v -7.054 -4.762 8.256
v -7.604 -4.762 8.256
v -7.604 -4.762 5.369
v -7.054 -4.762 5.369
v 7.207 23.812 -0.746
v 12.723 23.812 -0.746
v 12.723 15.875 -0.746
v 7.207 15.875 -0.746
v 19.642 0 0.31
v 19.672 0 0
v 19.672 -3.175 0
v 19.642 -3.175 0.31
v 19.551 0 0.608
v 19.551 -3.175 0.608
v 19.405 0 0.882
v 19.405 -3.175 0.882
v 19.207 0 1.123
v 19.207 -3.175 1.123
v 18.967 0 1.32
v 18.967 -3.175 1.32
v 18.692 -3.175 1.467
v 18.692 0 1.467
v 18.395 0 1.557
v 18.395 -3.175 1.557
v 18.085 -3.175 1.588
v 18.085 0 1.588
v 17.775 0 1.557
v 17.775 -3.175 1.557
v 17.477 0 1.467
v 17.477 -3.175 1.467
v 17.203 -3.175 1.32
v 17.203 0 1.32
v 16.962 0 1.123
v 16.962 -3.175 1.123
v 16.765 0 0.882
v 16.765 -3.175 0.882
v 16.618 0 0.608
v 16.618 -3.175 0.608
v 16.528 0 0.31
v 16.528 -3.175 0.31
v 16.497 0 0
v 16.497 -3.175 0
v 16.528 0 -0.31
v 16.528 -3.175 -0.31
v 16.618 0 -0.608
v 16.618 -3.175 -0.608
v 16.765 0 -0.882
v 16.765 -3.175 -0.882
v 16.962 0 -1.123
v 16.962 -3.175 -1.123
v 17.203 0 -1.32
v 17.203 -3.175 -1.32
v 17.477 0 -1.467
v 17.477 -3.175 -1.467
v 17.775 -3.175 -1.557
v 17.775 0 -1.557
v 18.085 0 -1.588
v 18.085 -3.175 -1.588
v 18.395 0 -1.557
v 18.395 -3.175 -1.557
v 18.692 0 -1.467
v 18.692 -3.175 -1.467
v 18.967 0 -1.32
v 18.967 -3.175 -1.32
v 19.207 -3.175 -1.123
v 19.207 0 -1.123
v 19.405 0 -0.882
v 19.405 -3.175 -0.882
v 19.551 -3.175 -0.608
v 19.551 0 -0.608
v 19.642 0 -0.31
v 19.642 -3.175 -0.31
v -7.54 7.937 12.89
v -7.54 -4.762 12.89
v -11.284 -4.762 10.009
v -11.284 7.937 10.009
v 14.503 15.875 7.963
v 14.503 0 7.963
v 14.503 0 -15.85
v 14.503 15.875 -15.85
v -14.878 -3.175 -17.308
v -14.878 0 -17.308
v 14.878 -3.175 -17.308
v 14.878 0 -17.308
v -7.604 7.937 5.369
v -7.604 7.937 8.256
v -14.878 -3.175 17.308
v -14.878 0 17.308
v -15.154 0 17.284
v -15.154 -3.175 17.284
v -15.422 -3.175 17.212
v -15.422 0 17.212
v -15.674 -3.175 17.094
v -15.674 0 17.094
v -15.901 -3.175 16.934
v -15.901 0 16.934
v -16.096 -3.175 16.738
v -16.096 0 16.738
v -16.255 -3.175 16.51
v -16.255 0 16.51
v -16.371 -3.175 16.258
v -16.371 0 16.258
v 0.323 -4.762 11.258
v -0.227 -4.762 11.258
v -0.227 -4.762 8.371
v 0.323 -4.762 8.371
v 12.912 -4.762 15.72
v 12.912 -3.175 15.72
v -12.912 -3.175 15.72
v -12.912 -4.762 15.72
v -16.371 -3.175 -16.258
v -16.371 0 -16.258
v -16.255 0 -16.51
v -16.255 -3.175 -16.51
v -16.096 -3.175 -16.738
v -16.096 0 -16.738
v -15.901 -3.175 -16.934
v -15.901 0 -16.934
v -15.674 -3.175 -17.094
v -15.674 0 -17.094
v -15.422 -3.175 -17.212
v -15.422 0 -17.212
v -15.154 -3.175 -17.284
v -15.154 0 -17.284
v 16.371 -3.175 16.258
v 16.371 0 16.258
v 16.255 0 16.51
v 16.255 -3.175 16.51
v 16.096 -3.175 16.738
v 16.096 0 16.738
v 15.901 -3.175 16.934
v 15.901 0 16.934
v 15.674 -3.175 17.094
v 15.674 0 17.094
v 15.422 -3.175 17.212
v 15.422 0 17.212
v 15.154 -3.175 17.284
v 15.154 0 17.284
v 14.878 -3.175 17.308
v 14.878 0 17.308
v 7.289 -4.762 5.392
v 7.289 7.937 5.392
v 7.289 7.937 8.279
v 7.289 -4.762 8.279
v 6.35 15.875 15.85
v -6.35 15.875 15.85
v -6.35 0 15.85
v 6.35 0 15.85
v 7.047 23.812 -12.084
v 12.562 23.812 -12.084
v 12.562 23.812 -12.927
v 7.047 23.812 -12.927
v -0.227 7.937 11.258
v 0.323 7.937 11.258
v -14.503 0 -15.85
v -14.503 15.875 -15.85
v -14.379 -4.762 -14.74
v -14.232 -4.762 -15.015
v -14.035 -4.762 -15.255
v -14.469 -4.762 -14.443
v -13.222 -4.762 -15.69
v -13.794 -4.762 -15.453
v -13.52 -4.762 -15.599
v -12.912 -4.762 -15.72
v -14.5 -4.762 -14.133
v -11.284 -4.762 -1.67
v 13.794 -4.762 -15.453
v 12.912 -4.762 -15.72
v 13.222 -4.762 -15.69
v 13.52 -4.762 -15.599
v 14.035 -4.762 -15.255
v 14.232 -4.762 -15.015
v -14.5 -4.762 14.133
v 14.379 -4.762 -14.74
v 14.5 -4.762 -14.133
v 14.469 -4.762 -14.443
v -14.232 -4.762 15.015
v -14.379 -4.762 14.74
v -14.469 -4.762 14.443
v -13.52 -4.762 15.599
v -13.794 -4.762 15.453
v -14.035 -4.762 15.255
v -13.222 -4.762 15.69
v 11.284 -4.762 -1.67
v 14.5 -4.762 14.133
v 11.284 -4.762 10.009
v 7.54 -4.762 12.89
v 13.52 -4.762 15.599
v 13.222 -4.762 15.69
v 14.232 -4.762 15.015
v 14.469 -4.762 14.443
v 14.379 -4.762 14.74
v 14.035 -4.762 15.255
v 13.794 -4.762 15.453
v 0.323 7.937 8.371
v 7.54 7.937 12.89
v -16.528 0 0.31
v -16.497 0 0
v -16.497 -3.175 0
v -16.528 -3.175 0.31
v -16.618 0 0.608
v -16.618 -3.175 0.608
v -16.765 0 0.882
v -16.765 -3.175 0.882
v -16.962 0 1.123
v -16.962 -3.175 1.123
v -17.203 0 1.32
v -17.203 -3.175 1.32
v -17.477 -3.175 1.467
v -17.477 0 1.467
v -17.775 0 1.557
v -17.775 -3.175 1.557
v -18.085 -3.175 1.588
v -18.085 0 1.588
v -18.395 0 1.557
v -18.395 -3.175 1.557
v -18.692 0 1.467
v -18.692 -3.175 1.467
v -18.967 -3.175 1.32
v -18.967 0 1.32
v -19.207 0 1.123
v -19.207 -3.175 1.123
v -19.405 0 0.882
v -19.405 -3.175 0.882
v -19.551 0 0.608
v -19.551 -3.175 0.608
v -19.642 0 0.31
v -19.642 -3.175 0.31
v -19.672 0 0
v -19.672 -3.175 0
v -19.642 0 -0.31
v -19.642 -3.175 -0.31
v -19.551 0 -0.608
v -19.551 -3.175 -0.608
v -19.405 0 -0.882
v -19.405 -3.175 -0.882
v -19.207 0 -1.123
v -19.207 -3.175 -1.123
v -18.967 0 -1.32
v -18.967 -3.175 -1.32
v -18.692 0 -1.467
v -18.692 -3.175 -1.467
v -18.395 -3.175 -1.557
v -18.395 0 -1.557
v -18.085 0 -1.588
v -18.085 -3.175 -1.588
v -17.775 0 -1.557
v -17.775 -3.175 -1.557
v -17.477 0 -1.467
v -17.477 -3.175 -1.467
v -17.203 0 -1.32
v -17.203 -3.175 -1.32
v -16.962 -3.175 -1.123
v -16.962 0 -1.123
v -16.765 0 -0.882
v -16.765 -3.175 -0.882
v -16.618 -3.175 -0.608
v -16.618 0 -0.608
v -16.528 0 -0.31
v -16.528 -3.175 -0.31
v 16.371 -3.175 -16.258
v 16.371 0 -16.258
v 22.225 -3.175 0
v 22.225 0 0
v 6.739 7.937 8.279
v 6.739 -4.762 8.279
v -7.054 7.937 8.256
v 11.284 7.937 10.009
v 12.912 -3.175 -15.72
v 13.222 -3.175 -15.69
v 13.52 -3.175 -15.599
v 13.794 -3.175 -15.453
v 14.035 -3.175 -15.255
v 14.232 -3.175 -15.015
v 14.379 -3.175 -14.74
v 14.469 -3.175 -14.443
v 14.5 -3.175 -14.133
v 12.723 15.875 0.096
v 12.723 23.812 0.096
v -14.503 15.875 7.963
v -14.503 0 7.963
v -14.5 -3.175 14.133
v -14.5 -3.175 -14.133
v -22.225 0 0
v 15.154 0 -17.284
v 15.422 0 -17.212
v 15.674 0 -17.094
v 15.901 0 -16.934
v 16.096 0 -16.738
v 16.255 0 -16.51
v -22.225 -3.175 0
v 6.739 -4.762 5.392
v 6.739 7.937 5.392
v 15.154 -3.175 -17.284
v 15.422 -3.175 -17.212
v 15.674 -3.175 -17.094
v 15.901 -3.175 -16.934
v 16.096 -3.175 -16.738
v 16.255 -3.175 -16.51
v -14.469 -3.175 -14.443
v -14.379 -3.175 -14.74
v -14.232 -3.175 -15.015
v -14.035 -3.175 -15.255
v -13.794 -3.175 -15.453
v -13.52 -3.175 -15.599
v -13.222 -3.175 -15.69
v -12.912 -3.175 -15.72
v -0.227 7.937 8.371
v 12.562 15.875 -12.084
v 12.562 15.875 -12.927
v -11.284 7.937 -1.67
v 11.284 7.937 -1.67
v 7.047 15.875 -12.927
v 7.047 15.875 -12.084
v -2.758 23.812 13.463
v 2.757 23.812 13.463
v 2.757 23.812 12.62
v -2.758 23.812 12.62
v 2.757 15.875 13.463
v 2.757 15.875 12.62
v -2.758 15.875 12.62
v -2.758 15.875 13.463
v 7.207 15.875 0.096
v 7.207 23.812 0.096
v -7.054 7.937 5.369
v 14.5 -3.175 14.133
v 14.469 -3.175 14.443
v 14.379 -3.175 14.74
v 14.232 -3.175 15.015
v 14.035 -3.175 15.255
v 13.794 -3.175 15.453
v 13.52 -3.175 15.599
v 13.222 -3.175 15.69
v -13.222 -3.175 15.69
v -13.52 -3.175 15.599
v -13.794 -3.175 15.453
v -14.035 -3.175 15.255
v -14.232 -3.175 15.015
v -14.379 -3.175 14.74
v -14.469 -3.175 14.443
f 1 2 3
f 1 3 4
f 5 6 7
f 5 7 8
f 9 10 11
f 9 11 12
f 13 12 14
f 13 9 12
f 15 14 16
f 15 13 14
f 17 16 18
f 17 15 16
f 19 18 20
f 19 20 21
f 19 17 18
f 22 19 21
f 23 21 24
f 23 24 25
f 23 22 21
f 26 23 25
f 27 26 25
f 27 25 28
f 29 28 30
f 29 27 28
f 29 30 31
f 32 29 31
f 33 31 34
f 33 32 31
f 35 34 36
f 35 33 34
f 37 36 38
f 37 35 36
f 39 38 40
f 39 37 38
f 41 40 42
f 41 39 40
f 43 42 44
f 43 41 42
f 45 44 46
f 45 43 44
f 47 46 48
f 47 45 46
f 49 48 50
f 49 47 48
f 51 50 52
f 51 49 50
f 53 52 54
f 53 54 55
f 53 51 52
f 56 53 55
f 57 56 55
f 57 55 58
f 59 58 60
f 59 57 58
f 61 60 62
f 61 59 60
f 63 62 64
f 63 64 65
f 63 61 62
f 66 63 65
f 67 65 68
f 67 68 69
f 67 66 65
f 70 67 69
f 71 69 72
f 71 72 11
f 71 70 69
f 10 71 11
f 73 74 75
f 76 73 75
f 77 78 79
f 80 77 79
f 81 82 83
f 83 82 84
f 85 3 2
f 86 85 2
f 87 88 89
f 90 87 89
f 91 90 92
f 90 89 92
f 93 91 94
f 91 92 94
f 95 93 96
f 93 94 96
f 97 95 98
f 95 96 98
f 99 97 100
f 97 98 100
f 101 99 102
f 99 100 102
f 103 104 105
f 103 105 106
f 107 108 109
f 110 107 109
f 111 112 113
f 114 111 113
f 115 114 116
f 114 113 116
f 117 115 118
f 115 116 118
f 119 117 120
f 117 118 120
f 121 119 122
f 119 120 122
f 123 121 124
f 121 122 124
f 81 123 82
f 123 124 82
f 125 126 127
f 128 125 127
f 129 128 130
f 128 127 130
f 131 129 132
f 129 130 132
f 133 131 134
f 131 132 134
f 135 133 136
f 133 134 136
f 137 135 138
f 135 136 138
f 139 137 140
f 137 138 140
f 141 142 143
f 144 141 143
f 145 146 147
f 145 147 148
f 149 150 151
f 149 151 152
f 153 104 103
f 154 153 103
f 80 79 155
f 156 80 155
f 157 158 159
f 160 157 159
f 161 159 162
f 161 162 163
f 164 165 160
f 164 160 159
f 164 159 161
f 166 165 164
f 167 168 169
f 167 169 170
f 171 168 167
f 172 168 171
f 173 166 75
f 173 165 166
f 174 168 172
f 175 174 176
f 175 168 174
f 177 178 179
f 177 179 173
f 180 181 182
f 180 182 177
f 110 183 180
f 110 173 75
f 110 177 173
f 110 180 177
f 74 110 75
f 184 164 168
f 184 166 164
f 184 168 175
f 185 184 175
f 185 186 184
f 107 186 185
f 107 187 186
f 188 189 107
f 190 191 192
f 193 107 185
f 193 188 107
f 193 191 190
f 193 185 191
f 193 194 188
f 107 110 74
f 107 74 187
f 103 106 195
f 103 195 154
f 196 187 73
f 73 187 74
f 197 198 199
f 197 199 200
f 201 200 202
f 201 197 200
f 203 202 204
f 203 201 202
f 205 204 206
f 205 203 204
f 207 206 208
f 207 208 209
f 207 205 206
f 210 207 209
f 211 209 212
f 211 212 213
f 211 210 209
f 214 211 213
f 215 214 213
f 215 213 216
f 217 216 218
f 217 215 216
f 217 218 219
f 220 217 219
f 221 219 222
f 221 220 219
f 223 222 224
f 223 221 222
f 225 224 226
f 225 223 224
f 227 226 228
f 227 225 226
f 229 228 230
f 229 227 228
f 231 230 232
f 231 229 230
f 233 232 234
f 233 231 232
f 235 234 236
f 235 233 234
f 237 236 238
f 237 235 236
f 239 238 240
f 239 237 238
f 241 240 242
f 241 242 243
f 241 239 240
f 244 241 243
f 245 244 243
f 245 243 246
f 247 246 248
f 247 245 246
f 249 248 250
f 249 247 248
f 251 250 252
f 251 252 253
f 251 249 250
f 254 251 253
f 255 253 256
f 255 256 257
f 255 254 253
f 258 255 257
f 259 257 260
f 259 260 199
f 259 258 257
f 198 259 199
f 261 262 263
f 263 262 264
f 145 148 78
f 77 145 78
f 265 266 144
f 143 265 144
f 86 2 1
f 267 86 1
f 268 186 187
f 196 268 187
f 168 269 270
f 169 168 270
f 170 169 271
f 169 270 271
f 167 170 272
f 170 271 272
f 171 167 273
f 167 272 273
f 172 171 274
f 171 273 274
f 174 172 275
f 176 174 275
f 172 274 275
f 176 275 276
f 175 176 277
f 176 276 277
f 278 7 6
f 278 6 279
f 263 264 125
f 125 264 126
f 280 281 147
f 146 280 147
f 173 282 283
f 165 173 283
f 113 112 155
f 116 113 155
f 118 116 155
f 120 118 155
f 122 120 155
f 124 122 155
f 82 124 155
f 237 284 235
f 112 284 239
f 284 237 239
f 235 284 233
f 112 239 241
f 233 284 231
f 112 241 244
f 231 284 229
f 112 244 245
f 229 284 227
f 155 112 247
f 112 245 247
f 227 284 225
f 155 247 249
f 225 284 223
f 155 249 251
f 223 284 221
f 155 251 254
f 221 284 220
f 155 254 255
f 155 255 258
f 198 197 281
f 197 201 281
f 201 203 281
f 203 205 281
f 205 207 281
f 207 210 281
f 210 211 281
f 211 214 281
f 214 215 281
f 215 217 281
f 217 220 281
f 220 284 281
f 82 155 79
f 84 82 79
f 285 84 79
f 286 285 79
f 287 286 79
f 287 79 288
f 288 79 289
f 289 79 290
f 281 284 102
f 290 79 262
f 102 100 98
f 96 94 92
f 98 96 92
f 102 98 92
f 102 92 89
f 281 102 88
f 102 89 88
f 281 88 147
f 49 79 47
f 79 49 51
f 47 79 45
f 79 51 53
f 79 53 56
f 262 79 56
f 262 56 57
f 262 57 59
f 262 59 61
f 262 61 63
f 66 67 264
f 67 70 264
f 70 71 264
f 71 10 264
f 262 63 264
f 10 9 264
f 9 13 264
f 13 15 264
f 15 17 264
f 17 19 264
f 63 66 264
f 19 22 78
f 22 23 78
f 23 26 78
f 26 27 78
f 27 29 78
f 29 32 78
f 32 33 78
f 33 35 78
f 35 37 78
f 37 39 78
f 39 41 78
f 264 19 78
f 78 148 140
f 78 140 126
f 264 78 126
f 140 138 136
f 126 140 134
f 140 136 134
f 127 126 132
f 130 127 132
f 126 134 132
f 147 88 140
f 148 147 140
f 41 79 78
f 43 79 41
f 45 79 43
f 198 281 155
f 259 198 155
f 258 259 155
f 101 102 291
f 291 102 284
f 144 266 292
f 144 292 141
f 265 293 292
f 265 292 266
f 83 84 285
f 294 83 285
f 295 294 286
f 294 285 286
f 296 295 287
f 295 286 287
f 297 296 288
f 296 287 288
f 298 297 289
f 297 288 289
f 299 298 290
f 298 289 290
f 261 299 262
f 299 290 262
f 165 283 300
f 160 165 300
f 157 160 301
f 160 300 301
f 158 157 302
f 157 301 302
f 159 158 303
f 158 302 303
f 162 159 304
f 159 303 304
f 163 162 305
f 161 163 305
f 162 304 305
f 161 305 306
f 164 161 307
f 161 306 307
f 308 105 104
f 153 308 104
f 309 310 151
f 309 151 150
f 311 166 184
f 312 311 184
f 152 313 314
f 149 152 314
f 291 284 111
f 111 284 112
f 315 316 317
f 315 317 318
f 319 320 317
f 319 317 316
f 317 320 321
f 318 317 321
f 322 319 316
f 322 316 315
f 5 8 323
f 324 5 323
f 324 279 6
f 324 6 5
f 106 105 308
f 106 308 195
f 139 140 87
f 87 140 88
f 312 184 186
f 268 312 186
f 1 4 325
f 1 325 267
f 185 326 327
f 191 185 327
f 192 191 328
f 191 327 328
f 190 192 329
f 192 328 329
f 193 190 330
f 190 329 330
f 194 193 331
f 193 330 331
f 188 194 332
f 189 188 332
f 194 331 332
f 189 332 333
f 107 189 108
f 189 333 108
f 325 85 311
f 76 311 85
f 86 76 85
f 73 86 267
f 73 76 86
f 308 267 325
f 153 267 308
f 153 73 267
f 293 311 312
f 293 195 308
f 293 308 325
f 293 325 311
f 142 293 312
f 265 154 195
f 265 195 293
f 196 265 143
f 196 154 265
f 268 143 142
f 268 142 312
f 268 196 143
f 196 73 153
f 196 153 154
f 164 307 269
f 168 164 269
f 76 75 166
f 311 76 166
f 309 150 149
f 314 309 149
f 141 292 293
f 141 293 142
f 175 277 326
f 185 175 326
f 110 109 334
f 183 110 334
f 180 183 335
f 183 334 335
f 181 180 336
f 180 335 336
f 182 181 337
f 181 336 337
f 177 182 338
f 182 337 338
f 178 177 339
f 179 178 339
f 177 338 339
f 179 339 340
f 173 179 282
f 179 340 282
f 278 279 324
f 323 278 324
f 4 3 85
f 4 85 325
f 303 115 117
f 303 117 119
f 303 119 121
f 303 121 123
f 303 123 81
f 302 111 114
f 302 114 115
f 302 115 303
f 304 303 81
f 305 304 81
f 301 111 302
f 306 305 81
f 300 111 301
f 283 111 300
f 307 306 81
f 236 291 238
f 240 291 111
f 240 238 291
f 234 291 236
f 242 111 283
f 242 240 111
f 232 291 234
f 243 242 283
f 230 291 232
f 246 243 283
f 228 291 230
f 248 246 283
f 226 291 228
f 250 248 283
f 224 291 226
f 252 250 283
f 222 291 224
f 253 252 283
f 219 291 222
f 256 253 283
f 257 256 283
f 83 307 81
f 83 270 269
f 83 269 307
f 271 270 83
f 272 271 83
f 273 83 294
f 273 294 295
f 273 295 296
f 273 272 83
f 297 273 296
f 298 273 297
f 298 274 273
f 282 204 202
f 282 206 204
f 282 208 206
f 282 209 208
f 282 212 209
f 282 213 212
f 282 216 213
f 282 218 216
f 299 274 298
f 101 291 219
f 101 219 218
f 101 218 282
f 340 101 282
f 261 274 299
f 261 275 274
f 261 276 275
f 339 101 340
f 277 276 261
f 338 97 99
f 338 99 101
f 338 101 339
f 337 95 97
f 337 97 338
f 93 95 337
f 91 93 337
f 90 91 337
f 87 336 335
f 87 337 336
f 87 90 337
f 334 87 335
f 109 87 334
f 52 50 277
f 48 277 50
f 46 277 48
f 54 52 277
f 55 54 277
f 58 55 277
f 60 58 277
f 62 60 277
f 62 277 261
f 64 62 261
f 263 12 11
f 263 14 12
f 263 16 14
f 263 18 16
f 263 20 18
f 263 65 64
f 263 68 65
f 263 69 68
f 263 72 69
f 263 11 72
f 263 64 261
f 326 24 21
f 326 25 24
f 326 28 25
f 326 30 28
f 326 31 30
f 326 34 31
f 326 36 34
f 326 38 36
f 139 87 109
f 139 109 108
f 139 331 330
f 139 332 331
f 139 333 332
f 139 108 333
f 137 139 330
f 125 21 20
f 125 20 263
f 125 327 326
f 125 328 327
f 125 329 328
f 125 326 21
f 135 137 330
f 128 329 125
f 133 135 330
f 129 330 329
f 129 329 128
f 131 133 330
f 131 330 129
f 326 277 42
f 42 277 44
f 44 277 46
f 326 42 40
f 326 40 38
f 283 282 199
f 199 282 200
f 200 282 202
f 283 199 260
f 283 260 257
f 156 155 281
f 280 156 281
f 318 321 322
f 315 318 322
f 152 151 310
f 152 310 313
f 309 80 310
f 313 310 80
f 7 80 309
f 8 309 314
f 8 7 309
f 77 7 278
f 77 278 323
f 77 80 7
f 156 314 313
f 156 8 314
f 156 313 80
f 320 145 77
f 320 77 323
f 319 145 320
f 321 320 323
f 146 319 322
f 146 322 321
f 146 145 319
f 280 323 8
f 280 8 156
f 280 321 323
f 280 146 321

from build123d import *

# Parameters (mm, degrees)
F0_R     = 1.5875
F1_DEPTH = 3.175
F3_DEPTH = 1.5875
F5_DEPTH = 15.875
F6_W     = 5.5154263973
F6_H     = 0.8426345885
F7_DEPTH = 7.9375
F8_W     = 0.5498970859
F8_H     = 2.8869584203
F9_DEPTH = 12.7


# Not quite as in the source:
# - a feature names something its author has since deleted; it is built from what else it names


with BuildPart() as f1:
    # F0 (on Front) → F1 (new body)
    with BuildSketch(Plane.XZ):
        with BuildLine():
            ThreePointArc((16.3714576415, 16.2581077061), (15.790628657, 17.019159057), (14.8778171338, 17.3078398343))
            Line((14.8778171338, 17.3078398343), (-14.8778171338, 17.3078398343))
            ThreePointArc((-14.8778171338, 17.3078398343), (-15.790628657, 17.019159057), (-16.3714576415, 16.2581077061))
            Line((-16.3714576415, 16.2581077061), (-22.225, 0))
            Line((-22.225, 0), (-16.3714576415, -16.2581077061))
            ThreePointArc((-16.3714576415, -16.2581077061), (-15.790628657, -17.019159057), (-14.8778171338, -17.3078398343))
            Line((-14.8778171338, -17.3078398343), (14.8778171338, -17.3078398343))
            ThreePointArc((14.8778171338, -17.3078398343), (15.790628657, -17.019159057), (16.3714576415, -16.2581077061))
            Line((16.3714576415, -16.2581077061), (22.225, 0))
            Line((22.225, 0), (16.3714576415, 16.2581077061))
        make_face()
        with Locations((-18.0848, 0)):
            Circle(F0_R, mode=Mode.SUBTRACT)
        with BuildLine():
            ThreePointArc((-14.4999964, 14.1328398343), (-14.0350284151, 15.2553718495), (-12.9124964, 15.7203398343))
            Line((-12.9124964, 15.7203398343), (12.9124964, 15.7203398343))
            ThreePointArc((12.9124964, 15.7203398343), (14.0350284151, 15.2553718495), (14.4999964, 14.1328398343))
            Line((14.4999964, 14.1328398343), (14.4999964, -14.1328398343))
            ThreePointArc((14.4999964, -14.1328398343), (14.0350284151, -15.2553718495), (12.9124964, -15.7203398343))
            Line((12.9124964, -15.7203398343), (-12.9124964, -15.7203398343))
            ThreePointArc((-12.9124964, -15.7203398343), (-14.0350284151, -15.2553718495), (-14.4999964, -14.1328398343))
            Line((-14.4999964, -14.1328398343), (-14.4999964, 14.1328398343))
        make_face(mode=Mode.SUBTRACT)
        with Locations((18.0848, 0)):
            Circle(F0_R, mode=Mode.SUBTRACT)
        with BuildLine():
            Line((12.9124964, 15.7203398343), (-12.9124964, 15.7203398343))
            ThreePointArc((-12.9124964, 15.7203398343), (-14.0350284151, 15.2553718495), (-14.4999964, 14.1328398343))
            Line((-14.4999964, 14.1328398343), (-14.4999964, -14.1328398343))
            ThreePointArc((-14.4999964, -14.1328398343), (-14.0350284151, -15.2553718495), (-12.9124964, -15.7203398343))
            Line((-12.9124964, -15.7203398343), (12.9124964, -15.7203398343))
            ThreePointArc((12.9124964, -15.7203398343), (14.0350284151, -15.2553718495), (14.4999964, -14.1328398343))
            Line((14.4999964, -14.1328398343), (14.4999964, 14.1328398343))
            ThreePointArc((14.4999964, 14.1328398343), (14.0350284151, 15.2553718495), (12.9124964, 15.7203398343))
        make_face()
    extrude(amount=F1_DEPTH)

    # F2 (on face) → F3 (join)
    with BuildSketch(Plane.XZ.offset(3.175)):
        with BuildLine():
            Line((12.9124964, 15.7203398343), (-12.9124964, 15.7203398343))
            ThreePointArc((-12.9124964, 15.7203398343), (-14.0350284151, 15.2553718495), (-14.4999964, 14.1328398343))
            Line((-14.4999964, 14.1328398343), (-14.4999964, -14.1328398343))
            ThreePointArc((-14.4999964, -14.1328398343), (-14.0350284151, -15.2553718495), (-12.9124964, -15.7203398343))
            Line((-12.9124964, -15.7203398343), (12.9124964, -15.7203398343))
            ThreePointArc((12.9124964, -15.7203398343), (14.0350284151, -15.2553718495), (14.4999964, -14.1328398343))
            Line((14.4999964, -14.1328398343), (14.4999964, 14.1328398343))
            ThreePointArc((14.4999964, 14.1328398343), (14.0350284151, 15.2553718495), (12.9124964, 15.7203398343))
        make_face()
    extrude(amount=F3_DEPTH)

    # F4 (on face) → F5 (join)
    with BuildSketch(Plane(origin=(0, 0, 0), x_dir=(-1, 0, 0), z_dir=(0, 1, 0))):
        Polygon((6.35, 15.8496), (-6.35, 15.8496), (-14.5034, 7.9629), (-14.5034, -15.8496), (14.5034, -15.8496), (14.5034, 7.9629), align=None)
    extrude(amount=F5_DEPTH)

    # F6 (on face) → F7 (join)
    with BuildSketch(Plane(origin=(0, 15.875, 0), x_dir=(-1, 0, 0), z_dir=(0, 1, 0))):
        with Locations((0.0007232884, 13.041603379)):
            Rectangle(F6_W, F6_H)
        with Locations((-9.964916273, -0.3249486908)):
            Rectangle(F6_W, F6_H)
        with Locations((-9.8044754704, -12.5053403899)):
            Rectangle(F6_W, F6_H)
    extrude(amount=F7_DEPTH)

    # F8 (on face) → F9 (cut)
    with BuildSketch(Plane.XZ.offset(4.7625)):
        Polygon((-11.2841911614, 10.0093806594), (-11.2841911614, -1.6703880579), (11.2841911614, -1.6703880579), (11.2841911614, 10.0093806594), (7.5404811705, 12.8898254096), (-7.5404811705, 12.8898254096), align=None)
        with Locations((-7.3291899171, 6.8128034472)):
            Rectangle(F8_W, F8_H, mode=Mode.SUBTRACT)
        with Locations((7.0140829775, 6.8357163109)):
            Rectangle(F8_W, F8_H, mode=Mode.SUBTRACT)
        with Locations((0.0484438497, 9.8143247887)):
            Rectangle(F8_W, F8_H, mode=Mode.SUBTRACT)
    extrude(amount=-F9_DEPTH, mode=Mode.SUBTRACT)


solid = f1.part
